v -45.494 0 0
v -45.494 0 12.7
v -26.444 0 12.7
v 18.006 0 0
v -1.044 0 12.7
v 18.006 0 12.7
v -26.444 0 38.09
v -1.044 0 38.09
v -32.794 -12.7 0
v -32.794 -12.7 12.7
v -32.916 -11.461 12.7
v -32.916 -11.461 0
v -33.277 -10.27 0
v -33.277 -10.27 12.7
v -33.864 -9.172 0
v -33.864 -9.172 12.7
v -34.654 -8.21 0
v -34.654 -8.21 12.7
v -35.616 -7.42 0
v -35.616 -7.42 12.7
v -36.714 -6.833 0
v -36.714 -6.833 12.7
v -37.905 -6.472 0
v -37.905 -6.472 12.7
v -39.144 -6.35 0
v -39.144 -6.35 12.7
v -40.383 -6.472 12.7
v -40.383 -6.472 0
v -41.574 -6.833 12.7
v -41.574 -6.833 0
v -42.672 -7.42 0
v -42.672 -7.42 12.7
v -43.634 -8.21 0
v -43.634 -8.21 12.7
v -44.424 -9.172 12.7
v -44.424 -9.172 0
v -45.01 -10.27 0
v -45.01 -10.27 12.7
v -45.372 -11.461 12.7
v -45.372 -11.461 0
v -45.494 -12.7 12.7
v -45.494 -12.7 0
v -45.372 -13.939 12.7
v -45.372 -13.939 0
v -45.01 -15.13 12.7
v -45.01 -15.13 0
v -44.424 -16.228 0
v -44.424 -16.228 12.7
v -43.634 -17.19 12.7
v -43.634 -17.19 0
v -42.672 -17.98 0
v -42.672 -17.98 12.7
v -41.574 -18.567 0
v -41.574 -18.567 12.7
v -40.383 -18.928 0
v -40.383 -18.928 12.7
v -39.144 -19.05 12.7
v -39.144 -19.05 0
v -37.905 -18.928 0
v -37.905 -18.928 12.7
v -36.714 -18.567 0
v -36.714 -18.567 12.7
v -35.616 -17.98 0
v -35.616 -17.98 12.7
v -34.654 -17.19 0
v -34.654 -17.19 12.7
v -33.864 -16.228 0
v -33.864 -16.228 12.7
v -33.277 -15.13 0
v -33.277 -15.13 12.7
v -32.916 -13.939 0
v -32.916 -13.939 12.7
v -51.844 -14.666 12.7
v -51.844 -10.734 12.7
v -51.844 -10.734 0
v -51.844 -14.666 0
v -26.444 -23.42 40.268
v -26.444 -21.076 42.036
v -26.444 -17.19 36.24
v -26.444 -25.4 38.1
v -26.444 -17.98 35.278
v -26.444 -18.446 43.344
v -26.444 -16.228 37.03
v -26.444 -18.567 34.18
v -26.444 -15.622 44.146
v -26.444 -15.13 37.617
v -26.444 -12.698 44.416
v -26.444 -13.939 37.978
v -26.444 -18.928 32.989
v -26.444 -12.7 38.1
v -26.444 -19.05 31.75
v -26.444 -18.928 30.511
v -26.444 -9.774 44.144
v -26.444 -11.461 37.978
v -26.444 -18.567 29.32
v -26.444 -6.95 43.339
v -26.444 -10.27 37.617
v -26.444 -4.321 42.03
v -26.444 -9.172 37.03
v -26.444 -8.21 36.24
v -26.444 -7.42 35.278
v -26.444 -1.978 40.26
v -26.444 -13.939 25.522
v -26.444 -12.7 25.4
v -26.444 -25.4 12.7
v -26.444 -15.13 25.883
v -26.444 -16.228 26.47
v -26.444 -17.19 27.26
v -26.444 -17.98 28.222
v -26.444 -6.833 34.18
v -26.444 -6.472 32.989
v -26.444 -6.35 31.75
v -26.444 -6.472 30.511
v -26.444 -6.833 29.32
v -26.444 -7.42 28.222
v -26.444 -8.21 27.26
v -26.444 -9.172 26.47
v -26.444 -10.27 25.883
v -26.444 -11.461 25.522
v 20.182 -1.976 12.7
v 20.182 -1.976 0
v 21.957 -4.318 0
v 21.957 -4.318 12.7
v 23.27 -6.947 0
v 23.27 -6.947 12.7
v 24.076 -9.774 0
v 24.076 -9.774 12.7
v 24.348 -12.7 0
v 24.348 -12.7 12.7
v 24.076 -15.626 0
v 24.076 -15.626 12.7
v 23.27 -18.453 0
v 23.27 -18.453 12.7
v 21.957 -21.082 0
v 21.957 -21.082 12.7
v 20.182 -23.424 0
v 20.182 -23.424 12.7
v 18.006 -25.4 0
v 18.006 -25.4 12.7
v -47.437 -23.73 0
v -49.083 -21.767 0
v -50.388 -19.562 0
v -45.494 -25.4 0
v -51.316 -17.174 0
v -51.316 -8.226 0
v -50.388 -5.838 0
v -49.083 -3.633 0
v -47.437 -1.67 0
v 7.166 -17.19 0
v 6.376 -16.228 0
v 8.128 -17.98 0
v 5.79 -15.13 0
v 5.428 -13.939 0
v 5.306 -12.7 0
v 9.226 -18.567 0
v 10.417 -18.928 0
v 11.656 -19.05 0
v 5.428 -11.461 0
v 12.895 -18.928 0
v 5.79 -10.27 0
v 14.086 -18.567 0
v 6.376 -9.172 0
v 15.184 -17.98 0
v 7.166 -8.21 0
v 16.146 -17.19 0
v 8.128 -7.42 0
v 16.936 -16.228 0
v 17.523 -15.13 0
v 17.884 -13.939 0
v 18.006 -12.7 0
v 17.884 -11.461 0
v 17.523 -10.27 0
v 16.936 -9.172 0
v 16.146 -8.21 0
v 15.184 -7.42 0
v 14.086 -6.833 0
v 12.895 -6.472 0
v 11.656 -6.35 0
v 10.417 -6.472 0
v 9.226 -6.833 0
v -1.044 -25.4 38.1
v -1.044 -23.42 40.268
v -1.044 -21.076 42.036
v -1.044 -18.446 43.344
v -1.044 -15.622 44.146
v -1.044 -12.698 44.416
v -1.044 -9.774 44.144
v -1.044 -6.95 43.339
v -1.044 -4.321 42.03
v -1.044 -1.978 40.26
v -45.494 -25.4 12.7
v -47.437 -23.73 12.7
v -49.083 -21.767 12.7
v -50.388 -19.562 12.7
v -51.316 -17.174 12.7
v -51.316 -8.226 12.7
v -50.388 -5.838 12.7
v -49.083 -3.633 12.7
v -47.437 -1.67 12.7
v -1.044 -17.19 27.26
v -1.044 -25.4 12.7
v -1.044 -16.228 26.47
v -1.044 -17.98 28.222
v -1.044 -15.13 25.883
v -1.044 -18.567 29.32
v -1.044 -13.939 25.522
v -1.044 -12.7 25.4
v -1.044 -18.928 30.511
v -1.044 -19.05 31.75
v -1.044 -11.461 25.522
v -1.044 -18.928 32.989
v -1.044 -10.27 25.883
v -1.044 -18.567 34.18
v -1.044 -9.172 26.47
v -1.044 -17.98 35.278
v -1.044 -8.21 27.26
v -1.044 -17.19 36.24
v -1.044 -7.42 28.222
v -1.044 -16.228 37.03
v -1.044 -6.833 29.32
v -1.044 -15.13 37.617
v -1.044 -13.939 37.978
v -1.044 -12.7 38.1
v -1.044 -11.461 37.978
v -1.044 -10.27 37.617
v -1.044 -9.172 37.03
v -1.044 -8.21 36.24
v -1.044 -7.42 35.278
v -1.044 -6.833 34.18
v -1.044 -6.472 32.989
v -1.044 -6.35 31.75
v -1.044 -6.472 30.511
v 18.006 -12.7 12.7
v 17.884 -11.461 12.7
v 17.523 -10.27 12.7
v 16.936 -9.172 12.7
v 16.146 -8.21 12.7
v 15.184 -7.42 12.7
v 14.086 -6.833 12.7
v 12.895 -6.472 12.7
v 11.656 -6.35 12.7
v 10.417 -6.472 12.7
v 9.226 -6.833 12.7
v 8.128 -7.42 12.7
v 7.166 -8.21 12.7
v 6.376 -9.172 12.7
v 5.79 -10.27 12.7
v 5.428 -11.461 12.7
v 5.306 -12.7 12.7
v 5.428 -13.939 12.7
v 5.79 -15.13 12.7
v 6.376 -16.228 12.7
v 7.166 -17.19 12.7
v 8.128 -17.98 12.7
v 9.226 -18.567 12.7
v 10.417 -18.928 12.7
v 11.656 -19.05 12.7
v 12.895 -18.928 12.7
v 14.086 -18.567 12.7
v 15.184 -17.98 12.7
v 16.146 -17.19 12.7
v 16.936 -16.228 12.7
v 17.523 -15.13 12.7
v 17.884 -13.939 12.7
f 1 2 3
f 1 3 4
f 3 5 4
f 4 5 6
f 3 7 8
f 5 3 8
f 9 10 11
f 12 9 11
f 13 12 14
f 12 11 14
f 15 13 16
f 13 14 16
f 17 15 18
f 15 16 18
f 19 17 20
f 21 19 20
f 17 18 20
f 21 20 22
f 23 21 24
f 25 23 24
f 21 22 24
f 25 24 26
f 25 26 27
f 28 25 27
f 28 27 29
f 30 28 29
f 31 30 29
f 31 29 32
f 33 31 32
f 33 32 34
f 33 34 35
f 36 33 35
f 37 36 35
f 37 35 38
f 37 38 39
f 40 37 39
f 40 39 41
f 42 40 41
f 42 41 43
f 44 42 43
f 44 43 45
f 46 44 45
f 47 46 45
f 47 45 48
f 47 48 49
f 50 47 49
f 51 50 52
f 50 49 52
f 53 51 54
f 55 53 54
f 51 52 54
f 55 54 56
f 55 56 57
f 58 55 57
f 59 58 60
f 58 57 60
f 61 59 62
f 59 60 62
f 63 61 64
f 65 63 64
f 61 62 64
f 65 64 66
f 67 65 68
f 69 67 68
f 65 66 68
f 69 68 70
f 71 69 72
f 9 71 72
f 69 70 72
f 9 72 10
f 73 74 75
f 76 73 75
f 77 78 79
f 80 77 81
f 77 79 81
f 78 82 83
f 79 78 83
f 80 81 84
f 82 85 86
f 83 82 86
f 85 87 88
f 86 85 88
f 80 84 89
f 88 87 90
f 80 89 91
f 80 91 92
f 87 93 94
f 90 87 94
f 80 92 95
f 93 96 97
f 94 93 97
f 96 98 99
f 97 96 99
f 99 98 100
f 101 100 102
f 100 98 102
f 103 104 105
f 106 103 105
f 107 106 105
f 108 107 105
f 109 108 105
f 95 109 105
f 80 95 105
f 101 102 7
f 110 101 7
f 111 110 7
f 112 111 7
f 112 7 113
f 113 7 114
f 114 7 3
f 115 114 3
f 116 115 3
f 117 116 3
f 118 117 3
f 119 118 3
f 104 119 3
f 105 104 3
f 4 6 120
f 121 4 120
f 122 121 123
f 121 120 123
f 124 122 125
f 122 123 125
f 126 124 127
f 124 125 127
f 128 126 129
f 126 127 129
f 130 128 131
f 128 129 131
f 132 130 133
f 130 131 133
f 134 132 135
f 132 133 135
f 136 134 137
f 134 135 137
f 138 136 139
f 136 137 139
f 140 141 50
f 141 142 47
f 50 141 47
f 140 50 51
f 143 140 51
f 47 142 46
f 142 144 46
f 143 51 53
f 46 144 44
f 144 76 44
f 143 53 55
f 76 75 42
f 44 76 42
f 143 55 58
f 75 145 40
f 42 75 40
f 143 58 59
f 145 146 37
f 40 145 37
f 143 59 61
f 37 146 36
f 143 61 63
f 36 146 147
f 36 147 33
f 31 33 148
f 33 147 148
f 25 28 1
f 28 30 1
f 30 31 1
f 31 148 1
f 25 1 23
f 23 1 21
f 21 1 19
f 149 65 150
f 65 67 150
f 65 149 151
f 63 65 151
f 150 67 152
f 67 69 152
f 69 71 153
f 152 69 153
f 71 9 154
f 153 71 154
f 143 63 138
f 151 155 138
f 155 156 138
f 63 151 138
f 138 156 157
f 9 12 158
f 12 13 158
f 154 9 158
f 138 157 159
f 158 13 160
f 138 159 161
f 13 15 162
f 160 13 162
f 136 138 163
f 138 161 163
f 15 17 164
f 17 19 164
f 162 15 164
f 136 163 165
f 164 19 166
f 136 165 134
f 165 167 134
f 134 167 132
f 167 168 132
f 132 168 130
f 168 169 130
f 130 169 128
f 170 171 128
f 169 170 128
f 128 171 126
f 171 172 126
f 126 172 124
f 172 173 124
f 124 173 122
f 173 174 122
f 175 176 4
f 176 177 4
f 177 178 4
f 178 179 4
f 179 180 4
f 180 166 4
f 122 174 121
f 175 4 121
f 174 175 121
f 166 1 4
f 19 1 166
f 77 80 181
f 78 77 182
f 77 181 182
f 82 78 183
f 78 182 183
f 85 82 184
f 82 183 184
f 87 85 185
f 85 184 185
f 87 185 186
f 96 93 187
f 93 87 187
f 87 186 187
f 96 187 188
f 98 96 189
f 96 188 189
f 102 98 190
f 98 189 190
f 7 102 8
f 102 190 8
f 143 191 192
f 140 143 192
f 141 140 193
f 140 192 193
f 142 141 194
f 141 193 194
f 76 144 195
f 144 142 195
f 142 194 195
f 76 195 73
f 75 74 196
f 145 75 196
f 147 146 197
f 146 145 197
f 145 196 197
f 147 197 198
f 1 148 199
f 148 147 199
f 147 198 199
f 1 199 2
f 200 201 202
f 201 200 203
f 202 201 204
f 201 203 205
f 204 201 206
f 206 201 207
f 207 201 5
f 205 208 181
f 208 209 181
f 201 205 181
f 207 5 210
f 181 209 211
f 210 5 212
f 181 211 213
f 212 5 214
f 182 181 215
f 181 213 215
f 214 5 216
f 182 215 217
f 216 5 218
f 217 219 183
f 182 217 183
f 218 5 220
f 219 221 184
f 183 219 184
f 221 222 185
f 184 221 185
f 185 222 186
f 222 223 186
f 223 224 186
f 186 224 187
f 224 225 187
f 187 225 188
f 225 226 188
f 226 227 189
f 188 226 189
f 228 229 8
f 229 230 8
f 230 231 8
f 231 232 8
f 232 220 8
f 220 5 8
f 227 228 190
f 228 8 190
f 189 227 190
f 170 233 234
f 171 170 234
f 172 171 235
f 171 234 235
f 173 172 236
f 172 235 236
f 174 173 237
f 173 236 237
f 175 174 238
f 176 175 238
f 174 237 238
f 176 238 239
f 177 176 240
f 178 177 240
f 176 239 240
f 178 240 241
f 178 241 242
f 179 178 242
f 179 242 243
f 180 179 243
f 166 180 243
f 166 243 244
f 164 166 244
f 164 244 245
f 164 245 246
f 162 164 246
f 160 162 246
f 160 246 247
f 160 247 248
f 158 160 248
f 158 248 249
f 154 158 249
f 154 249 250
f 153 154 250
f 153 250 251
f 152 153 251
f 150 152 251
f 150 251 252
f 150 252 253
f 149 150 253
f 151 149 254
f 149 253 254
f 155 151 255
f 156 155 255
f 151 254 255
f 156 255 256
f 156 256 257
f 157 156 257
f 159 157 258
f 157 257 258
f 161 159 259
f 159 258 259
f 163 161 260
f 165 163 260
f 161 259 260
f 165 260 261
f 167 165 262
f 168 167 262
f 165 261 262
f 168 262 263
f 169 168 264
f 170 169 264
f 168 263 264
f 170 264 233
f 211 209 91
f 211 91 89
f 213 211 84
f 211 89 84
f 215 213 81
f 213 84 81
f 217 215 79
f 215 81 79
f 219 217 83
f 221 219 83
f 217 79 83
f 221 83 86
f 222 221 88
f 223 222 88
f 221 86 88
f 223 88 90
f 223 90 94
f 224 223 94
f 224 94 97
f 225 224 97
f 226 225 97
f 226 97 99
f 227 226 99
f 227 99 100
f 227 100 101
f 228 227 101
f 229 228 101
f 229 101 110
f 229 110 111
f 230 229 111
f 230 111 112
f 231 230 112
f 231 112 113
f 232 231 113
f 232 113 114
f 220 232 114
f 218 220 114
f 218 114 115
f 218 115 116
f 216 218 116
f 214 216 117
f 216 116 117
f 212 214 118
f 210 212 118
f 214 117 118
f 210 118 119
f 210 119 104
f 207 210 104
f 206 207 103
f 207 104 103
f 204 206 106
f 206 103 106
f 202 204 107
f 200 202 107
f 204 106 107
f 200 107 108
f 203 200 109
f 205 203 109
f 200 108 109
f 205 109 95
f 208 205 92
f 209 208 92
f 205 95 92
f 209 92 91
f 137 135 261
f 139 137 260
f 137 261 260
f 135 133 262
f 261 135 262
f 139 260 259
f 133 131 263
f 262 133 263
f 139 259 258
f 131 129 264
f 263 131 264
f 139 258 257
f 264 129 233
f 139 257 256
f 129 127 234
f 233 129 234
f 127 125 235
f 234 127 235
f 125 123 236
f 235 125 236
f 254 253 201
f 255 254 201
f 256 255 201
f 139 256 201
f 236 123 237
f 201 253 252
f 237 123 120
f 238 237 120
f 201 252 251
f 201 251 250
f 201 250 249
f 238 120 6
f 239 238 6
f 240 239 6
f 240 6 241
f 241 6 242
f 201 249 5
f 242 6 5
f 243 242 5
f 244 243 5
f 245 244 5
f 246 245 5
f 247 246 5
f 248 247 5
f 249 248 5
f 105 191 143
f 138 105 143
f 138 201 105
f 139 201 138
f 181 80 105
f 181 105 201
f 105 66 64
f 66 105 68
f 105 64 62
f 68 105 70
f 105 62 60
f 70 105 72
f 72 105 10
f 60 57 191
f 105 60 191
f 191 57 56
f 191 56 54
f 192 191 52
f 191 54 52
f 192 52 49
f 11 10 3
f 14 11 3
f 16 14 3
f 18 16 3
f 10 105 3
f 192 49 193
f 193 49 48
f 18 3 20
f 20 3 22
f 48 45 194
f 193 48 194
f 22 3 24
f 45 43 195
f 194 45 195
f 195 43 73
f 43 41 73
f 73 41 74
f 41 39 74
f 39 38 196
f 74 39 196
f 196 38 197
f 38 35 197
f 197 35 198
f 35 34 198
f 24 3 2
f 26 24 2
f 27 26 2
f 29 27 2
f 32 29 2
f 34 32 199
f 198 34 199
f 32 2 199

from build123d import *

# Parameters (mm, degrees)
F1_DEPTH  = 25.4
F2_R      = 6.35
F3_DEPTH  = 50.801
F5_DEPTH  = 50.801
F6_R      = 6.35
F7_DEPTH  = 12.701
F9_DEPTH  = 12.701
F11_DEPTH = 12.701


with BuildPart() as f1:
    # F0 (on Front) → F1 (new body)
    with BuildSketch(Plane.XZ):
        Polygon((-51.843755758, 12.7), (-51.843755758, 0), (24.356244242, 0), (24.356244242, 12.7), (-1.043755758, 12.7), (-1.043755758, 44.45), (-26.443755758, 44.45), (-26.443755758, 12.7), align=None)
    extrude(amount=F1_DEPTH)

    # F2 (on face) → F3 (cut, through all)
    with BuildSketch(Plane(origin=(-26.443755758, 0, 0), x_dir=(0, -1, 0), z_dir=(-1, 0, 0))):
        with Locations((12.7, 31.75)):
            Circle(F2_R)
    extrude(amount=-F3_DEPTH, mode=Mode.SUBTRACT)

    # F4 (on face) → F5 (cut, through all)
    with BuildSketch(Plane.YZ.offset(-1.043755758)):
        with BuildLine():
            ThreePointArc((-25.4, 38.1), (-12.6975472927, 44.4155540641), (0, 38.0901433527))
            Line((0, 38.0901433527), (0, 44.45))
            Line((0, 44.45), (-25.4, 44.45))
            Line((-25.4, 44.45), (-25.4, 38.1))
        make_face()
    extrude(amount=-F5_DEPTH, mode=Mode.SUBTRACT)

    # F6 (on face) → F7 (cut, through all)
    with BuildSketch(Plane.XY.offset(12.7)):
        with Locations((-39.143755758, -12.7)):
            Circle(F6_R)
        with Locations((11.656244242, -12.7)):
            Circle(F6_R)
    extrude(amount=-F7_DEPTH, mode=Mode.SUBTRACT)

    # F8 (on face) → F9 (cut, through all)
    with BuildSketch(Plane.XY.offset(12.7)):
        with BuildLine():
            ThreePointArc((-45.493755758, -25.4), (-49.7807083247, -20.6909850484), (-51.843755758, -14.6663174715))
            Line((-51.843755758, -14.6663174715), (-51.843755758, -25.4))
            Line((-51.843755758, -25.4), (-45.493755758, -25.4))
        make_face()
        with BuildLine():
            ThreePointArc((-51.843755758, -10.7336825285), (-49.7807083247, -4.7090149516), (-45.493755758, 0))
            Line((-45.493755758, 0), (-51.843755758, 0))
            Line((-51.843755758, 0), (-51.843755758, -10.7336825285))
        make_face()
    extrude(amount=-F9_DEPTH, mode=Mode.SUBTRACT)

    # F10 (on face) → F11 (cut, through all)
    with BuildSketch(Plane.XY.offset(12.7)):
        with BuildLine():
            ThreePointArc((18.006244242, 0), (24.3479033898, -12.7), (18.006244242, -25.4))
            Line((18.006244242, -25.4), (24.356244242, -25.4))
            Line((24.356244242, -25.4), (24.356244242, 0))
            Line((24.356244242, 0), (18.006244242, 0))
        make_face()
    extrude(amount=-F11_DEPTH, mode=Mode.SUBTRACT)


solid = f1.part
